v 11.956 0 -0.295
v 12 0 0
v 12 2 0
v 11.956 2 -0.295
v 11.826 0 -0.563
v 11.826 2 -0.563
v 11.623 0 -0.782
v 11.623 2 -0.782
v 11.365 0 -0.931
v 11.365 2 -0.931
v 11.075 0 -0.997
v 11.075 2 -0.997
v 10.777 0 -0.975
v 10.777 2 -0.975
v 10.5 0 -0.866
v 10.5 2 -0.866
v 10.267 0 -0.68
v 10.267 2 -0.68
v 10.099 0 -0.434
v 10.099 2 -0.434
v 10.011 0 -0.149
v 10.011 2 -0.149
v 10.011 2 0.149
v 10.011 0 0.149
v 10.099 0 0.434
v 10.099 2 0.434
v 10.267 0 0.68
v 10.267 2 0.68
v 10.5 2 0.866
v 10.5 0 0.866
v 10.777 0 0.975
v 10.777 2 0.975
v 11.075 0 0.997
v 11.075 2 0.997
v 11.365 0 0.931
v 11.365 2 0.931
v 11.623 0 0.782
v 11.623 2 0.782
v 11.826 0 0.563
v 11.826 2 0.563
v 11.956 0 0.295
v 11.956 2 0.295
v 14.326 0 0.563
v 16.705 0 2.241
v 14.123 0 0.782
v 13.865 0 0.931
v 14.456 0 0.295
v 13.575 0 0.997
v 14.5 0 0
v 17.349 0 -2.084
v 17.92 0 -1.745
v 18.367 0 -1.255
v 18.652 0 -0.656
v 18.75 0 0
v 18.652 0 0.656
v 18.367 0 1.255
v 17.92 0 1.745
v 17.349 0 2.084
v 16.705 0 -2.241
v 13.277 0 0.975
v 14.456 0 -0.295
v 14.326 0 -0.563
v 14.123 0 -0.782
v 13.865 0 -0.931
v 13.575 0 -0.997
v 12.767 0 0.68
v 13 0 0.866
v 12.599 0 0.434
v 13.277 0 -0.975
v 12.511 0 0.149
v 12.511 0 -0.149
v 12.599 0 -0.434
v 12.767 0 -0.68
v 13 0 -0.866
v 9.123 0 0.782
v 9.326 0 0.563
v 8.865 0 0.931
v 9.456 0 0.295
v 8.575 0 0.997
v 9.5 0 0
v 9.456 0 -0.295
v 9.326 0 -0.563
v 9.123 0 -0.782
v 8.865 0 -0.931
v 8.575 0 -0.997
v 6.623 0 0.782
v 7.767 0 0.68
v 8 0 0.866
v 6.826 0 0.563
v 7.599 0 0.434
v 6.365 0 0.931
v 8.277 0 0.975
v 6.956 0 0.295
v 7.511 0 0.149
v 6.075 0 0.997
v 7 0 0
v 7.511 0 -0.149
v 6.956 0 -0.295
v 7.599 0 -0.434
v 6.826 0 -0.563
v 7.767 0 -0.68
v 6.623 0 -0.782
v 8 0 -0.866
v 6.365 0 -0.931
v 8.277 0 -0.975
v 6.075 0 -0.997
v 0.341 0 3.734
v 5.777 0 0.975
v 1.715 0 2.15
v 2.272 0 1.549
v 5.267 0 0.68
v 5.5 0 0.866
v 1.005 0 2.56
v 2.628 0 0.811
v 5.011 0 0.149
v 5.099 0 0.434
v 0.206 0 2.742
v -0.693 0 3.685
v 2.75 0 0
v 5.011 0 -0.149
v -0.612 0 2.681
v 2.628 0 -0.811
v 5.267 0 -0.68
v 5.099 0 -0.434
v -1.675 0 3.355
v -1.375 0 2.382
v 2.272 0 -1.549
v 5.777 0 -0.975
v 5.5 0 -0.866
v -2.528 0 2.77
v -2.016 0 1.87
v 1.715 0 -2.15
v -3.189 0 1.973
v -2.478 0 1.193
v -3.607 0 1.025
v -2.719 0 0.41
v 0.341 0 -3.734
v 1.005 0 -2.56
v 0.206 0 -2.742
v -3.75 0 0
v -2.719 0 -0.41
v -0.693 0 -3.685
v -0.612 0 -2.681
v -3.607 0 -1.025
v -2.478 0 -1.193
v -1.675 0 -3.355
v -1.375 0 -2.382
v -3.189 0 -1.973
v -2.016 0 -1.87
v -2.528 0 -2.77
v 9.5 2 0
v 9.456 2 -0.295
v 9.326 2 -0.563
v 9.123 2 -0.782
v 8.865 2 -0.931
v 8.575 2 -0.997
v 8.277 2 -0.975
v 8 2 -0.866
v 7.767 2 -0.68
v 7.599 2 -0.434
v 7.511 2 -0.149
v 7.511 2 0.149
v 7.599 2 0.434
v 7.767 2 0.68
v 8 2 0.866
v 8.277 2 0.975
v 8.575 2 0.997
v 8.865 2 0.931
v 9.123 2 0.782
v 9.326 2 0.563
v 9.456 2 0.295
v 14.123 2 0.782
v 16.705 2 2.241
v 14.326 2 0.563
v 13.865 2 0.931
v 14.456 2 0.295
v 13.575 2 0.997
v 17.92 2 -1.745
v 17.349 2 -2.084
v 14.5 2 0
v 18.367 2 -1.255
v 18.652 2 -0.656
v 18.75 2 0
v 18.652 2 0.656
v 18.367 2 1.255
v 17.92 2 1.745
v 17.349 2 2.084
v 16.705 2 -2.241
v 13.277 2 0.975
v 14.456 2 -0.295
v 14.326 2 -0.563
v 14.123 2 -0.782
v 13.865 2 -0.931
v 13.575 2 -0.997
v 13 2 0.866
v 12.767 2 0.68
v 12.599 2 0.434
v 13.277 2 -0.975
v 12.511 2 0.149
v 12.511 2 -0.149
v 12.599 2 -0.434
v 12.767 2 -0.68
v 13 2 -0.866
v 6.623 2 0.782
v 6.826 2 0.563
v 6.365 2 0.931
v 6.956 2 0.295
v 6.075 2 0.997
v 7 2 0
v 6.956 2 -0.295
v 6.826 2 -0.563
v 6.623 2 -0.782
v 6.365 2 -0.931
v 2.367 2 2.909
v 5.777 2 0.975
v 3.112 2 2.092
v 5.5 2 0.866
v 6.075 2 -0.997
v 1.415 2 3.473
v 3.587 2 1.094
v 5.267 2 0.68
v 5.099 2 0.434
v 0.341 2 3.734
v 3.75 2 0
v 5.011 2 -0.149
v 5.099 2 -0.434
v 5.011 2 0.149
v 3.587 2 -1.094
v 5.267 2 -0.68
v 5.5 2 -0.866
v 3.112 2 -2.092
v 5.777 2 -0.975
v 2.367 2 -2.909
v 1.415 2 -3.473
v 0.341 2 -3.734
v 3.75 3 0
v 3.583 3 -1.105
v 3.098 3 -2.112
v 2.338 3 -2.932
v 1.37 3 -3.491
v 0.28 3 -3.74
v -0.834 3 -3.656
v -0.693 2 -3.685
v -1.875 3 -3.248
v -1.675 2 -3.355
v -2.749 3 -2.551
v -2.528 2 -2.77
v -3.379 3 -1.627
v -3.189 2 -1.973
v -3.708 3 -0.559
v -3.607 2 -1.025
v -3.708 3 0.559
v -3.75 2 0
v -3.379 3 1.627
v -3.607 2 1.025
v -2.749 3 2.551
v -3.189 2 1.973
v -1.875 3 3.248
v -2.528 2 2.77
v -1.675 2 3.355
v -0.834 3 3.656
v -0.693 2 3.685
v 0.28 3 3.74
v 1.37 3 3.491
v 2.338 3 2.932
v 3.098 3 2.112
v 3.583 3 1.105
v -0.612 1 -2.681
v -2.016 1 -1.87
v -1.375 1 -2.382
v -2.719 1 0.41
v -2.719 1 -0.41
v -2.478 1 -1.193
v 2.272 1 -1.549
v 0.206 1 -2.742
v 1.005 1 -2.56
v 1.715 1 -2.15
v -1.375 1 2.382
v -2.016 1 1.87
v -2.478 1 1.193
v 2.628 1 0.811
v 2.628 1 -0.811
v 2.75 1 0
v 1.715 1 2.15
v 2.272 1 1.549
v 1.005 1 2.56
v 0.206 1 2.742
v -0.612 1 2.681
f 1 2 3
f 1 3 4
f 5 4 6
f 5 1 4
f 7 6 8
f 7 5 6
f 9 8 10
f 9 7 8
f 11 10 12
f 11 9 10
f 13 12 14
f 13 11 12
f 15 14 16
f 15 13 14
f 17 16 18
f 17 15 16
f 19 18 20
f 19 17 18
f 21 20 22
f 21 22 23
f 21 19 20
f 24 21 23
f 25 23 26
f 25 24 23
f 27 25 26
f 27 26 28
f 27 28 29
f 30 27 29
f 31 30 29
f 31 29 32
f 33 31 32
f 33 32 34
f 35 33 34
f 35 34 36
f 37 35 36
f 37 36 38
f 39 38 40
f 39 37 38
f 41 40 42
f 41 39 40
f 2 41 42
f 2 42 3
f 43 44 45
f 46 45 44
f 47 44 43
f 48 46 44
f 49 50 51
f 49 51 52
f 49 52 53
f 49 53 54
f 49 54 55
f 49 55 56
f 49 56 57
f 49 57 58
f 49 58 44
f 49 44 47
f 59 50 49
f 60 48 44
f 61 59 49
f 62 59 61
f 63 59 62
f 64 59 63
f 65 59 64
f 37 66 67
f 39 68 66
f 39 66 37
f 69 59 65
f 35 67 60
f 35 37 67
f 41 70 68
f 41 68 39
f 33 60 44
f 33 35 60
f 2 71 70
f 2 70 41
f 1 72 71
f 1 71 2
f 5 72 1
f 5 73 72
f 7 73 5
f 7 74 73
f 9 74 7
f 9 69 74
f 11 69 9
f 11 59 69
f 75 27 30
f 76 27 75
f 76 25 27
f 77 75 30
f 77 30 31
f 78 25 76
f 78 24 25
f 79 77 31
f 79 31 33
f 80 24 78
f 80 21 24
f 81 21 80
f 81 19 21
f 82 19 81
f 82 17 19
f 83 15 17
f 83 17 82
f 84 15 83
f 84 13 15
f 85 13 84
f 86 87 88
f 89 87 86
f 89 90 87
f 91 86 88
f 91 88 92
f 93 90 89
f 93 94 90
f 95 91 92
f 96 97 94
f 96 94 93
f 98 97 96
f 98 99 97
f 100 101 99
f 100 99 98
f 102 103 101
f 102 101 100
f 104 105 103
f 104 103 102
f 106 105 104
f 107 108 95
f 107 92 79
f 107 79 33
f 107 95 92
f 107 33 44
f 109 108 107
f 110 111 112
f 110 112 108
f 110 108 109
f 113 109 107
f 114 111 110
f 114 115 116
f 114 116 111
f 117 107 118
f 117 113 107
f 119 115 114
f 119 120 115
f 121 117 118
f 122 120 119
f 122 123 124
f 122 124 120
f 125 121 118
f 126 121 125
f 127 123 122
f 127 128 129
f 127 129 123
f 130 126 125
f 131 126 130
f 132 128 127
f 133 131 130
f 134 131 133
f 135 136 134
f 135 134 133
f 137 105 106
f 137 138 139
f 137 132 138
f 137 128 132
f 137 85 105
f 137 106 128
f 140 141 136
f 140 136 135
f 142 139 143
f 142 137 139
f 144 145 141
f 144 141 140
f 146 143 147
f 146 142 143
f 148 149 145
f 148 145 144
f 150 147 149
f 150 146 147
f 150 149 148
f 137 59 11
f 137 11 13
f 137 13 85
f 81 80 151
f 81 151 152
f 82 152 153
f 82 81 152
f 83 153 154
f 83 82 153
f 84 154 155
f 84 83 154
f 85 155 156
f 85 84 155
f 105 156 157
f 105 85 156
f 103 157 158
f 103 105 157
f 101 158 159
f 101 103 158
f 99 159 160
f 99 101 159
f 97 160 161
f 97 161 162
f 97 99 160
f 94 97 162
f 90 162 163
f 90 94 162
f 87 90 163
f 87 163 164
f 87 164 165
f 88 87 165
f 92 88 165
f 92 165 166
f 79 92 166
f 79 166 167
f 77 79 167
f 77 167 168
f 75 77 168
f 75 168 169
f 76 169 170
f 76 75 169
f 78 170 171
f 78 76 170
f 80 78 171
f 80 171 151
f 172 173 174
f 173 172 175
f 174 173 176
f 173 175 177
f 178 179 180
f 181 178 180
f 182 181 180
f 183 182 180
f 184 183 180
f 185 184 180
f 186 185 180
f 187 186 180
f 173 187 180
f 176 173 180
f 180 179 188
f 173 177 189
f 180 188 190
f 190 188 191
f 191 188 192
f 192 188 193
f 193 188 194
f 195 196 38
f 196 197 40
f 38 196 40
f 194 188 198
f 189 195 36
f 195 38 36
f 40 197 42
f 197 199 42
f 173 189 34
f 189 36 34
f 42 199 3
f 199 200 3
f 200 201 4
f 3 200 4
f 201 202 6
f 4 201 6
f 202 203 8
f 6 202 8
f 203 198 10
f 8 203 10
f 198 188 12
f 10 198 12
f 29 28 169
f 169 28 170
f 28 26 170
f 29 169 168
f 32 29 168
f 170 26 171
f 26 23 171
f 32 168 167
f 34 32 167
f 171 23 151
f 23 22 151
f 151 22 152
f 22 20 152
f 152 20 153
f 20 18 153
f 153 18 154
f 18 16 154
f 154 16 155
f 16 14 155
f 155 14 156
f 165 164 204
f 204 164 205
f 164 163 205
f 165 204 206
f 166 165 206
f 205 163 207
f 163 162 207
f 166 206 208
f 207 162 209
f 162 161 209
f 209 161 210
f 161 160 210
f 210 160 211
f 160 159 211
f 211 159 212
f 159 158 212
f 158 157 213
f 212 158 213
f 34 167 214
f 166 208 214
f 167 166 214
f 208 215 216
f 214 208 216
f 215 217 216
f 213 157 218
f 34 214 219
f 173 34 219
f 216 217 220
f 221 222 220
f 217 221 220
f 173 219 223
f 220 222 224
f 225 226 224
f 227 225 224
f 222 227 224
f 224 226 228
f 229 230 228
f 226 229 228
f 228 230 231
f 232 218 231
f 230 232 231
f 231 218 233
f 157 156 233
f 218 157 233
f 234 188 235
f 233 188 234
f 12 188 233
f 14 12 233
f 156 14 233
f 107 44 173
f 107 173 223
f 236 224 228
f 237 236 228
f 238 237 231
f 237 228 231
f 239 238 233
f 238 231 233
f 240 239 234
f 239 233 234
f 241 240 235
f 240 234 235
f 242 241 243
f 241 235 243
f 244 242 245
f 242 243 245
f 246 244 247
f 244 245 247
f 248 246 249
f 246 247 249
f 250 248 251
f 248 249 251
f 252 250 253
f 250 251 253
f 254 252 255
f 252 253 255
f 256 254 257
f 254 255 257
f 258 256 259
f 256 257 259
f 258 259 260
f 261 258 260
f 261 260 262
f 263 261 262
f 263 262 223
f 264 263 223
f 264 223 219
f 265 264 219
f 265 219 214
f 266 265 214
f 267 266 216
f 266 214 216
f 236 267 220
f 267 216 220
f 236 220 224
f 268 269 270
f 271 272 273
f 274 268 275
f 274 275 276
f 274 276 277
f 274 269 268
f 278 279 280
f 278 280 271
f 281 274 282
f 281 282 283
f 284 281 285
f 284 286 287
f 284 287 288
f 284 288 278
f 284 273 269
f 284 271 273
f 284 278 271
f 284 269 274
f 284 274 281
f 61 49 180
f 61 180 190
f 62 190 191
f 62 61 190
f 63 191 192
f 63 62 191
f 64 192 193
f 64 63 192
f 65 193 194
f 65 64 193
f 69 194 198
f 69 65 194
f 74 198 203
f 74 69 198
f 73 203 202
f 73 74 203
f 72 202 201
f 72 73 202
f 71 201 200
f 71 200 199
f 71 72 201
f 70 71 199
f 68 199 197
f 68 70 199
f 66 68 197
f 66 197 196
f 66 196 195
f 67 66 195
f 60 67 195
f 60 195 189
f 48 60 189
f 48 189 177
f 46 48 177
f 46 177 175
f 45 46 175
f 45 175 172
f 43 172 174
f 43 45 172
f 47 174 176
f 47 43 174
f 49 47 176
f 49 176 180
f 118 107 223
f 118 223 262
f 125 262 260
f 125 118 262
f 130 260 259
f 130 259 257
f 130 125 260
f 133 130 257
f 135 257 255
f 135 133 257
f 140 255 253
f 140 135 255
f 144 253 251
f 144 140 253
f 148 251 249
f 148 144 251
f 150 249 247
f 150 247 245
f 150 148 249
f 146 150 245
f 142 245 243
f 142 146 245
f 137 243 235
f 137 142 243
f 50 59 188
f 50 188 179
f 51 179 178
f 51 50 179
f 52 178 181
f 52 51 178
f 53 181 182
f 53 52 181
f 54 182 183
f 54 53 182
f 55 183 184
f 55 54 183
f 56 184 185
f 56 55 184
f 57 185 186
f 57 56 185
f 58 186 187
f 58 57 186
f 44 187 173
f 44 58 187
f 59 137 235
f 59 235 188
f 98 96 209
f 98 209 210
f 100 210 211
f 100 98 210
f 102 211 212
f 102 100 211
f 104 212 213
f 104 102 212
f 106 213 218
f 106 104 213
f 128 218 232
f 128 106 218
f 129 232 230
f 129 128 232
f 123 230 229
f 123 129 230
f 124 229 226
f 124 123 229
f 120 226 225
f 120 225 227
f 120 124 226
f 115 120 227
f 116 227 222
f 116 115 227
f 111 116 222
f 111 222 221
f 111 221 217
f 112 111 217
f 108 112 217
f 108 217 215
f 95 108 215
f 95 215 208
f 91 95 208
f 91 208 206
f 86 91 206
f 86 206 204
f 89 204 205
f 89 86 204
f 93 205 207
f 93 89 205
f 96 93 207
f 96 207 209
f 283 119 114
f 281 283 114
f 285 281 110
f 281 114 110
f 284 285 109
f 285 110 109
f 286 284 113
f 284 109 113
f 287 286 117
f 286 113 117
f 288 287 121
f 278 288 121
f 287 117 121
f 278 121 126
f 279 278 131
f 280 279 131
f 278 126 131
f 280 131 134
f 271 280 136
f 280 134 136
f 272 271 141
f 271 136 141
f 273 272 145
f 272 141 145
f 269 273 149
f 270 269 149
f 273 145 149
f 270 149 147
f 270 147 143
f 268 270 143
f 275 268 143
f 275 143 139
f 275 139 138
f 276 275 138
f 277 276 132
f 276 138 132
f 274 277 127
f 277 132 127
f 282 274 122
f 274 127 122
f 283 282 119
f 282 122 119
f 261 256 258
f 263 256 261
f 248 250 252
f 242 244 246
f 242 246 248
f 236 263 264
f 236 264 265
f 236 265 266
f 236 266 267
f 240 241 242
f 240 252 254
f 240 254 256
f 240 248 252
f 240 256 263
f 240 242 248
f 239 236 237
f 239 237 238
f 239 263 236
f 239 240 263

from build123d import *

# Parameters (mm, degrees)
SKETCH1_R           = 1
BOSS_EXTRUDE1_DEPTH = 2
SKETCH2_R           = 3.75
BOSS_EXTRUDE2_DEPTH = 1
SKETCH3_R           = 2.75
CUT_EXTRUDE1_DEPTH  = 1


with BuildPart() as part:
    # Sketch1 → Boss-Extrude1 (new body)
    with BuildSketch(Plane(origin=(0, 0, 0), x_dir=(1, 0, 0), z_dir=(0, 1, 0))):
        with BuildLine():
            Line((0.340909091, 3.734471983), (16.704545455, 2.24068319))
            ThreePointArc((16.704545455, 2.24068319), (18.75, 0), (16.704545455, -2.24068319))
            Line((16.704545455, -2.24068319), (0.340909091, -3.734471983))
            ThreePointArc((0.340909091, -3.734471983), (-3.75, 0), (0.340909091, 3.734471983))
        make_face()
        with Locations((6, 0)):
            Circle(SKETCH1_R, mode=Mode.SUBTRACT)
        with Locations((8.5, 0)):
            Circle(SKETCH1_R, mode=Mode.SUBTRACT)
        with Locations((11, 0)):
            Circle(SKETCH1_R, mode=Mode.SUBTRACT)
        with Locations((13.5, 0)):
            Circle(SKETCH1_R, mode=Mode.SUBTRACT)
    extrude(amount=BOSS_EXTRUDE1_DEPTH)

    # Sketch2 → Boss-Extrude2 (add)
    with BuildSketch(Plane(origin=(0, 2, 0), x_dir=(1, 0, 0), z_dir=(0, 1, 0))):
        Circle(SKETCH2_R)
    extrude(amount=BOSS_EXTRUDE2_DEPTH)

    # Sketch3 → Cut-Extrude1 (cut)
    with BuildSketch(Plane.XZ):
        Circle(SKETCH3_R)
    extrude(amount=-CUT_EXTRUDE1_DEPTH, mode=Mode.SUBTRACT)


solid = part.part
